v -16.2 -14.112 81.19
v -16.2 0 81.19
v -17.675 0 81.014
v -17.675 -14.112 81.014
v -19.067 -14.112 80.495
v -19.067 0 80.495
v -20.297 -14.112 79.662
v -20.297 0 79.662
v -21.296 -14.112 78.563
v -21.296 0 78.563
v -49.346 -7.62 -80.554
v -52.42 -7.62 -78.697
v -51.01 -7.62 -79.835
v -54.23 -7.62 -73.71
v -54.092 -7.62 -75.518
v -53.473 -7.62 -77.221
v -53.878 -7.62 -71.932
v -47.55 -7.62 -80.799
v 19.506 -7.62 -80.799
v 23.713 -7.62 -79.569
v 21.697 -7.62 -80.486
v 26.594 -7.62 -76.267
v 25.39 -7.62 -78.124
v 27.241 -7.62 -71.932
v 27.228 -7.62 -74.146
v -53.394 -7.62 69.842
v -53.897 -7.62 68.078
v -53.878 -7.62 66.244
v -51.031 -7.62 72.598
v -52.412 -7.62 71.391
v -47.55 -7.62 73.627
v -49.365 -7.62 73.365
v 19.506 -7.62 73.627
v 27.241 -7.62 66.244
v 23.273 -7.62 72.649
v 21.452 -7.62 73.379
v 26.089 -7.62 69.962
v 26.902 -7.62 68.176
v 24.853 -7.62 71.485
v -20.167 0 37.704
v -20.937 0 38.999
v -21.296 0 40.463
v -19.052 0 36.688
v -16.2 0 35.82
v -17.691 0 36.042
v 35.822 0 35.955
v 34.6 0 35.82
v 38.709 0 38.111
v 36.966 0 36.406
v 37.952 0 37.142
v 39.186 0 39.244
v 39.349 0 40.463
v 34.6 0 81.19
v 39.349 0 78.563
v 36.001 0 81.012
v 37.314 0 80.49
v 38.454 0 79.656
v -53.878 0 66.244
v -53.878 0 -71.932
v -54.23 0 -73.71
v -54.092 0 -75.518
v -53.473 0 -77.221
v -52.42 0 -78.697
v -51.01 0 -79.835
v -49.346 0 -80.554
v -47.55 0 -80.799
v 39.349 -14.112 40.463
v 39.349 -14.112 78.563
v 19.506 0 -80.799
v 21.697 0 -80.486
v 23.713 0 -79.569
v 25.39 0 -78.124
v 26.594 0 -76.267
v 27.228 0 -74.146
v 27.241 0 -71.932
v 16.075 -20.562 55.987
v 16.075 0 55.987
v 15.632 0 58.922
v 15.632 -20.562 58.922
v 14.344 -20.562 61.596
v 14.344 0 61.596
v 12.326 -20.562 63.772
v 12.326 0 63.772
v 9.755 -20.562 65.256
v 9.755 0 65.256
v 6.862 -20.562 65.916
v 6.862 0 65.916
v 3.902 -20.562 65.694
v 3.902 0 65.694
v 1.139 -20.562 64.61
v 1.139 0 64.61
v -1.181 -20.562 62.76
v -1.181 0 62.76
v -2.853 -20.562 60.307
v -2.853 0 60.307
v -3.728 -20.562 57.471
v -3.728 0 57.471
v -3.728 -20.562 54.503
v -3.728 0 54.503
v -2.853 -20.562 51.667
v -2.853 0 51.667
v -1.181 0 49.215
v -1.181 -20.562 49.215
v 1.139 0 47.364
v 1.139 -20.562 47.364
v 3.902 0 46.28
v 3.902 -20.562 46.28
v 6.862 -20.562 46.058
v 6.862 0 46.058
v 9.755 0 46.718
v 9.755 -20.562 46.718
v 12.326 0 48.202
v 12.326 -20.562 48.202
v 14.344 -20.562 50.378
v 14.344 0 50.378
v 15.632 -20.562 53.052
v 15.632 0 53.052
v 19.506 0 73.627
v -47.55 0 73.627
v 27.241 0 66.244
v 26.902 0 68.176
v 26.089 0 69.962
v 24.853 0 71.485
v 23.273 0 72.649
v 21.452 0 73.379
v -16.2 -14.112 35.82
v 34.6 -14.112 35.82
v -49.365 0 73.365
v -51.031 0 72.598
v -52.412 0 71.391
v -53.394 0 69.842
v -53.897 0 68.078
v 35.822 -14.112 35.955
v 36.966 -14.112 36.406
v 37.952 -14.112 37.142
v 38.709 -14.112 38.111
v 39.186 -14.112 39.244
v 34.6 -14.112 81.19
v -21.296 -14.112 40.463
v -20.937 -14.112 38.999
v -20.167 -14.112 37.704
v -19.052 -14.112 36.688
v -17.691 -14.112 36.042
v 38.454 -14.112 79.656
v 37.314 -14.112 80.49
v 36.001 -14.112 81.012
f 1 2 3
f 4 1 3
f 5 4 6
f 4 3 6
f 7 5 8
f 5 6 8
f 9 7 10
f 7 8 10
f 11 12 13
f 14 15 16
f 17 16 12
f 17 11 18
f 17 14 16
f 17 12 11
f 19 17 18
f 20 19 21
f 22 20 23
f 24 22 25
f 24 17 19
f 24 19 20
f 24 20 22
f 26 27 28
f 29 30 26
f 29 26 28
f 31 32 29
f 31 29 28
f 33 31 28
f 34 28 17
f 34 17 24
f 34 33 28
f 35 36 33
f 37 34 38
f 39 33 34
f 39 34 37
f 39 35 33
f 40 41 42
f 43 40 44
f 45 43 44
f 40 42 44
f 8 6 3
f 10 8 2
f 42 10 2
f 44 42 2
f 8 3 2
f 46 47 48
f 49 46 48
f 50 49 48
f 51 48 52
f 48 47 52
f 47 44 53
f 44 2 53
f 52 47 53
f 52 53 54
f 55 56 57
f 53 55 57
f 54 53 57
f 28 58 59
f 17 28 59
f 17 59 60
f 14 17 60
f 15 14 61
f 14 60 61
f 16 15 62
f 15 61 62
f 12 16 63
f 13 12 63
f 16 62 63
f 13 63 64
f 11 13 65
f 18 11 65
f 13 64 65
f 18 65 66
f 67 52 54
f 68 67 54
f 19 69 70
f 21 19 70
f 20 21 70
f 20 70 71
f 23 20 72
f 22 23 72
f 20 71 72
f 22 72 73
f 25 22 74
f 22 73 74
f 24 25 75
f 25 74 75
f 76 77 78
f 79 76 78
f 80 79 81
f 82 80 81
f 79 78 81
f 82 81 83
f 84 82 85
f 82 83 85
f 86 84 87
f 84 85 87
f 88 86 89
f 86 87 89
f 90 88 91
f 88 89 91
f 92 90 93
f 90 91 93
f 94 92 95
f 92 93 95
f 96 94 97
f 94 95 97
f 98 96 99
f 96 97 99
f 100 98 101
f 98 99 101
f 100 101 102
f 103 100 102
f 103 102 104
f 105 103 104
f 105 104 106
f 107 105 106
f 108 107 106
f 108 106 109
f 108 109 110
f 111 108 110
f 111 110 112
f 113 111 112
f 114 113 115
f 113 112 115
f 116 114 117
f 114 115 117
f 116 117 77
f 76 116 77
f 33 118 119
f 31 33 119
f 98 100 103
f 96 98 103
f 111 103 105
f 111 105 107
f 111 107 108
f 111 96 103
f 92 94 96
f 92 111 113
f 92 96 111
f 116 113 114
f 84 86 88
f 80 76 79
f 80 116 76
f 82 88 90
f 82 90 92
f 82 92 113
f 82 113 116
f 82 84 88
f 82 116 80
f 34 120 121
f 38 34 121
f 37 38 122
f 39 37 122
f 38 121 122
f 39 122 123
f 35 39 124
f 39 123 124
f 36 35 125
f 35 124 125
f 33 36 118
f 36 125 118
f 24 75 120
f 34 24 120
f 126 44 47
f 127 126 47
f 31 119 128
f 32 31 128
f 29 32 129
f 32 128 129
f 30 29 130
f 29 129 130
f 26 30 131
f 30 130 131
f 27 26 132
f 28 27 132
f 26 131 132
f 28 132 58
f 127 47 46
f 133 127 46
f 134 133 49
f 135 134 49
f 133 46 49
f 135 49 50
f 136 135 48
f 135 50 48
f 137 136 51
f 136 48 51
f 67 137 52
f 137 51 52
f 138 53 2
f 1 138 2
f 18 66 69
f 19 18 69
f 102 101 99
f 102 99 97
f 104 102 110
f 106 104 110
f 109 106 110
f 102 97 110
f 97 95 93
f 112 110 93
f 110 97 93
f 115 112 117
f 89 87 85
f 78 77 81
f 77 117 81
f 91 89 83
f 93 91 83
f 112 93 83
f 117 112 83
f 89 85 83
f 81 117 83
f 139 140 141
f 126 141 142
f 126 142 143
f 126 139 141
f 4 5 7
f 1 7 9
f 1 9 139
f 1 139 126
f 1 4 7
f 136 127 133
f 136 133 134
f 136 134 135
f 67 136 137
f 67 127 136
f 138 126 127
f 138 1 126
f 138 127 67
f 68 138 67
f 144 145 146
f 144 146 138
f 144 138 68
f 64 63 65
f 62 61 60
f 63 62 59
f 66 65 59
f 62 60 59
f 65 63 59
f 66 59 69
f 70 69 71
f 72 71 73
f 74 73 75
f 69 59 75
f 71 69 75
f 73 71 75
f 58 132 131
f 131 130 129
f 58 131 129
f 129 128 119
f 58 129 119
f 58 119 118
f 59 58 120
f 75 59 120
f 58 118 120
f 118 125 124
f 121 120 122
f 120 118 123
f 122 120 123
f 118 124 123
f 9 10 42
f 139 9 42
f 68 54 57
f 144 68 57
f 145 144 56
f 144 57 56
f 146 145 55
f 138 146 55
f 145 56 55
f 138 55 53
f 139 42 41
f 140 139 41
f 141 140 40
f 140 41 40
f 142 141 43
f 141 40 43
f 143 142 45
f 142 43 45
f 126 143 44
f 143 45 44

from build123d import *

# Parameters (mm, degrees)
F1_DEPTH = 7.62
F4_DEPTH = 14.11188
F3_R     = 9.956999
F5_DEPTH = 20.56223


with BuildPart() as f1:
    # F0 (on Front) → F1 (new body)
    with BuildSketch(Plane.XZ):
        with BuildLine():
            Line((19.506192, 73.627215), (-47.549808, 73.627215))
            ThreePointArc((-47.549808, 73.627215), (-52.412098, 71.390879), (-53.878481, 66.243765))
            Line((-53.878481, 66.243765), (-53.878481, -71.932235))
            ThreePointArc((-53.878481, -71.932235), (-52.996778, -77.994965), (-47.549808, -80.799357))
            Line((-47.549808, -80.799357), (19.506192, -80.799357))
            ThreePointArc((19.506192, -80.799357), (25.389577, -78.124289), (27.241243, -71.932235))
            Line((27.241243, -71.932235), (27.241243, 66.243765))
            ThreePointArc((27.241243, 66.243765), (24.852835, 71.485043), (19.506192, 73.627215))
        make_face()
    extrude(amount=F1_DEPTH)


with BuildPart() as f4:
    # F2 (on Front) → F4 (new body)
    with BuildSketch(Plane.XZ):
        with BuildLine():
            Line((-16.199785, 35.819632), (34.600215, 35.819632))
            ThreePointArc((34.600215, 35.819632), (37.951748, 37.142304), (39.349227, 40.46334))
            Line((39.349227, 40.46334), (39.349227, 78.56334))
            ThreePointArc((39.349227, 78.56334), (37.313708, 80.489545), (34.600215, 81.189945))
            Line((34.600215, 81.189945), (-16.199785, 81.189945))
            ThreePointArc((-16.199785, 81.189945), (-19.066591, 80.494671), (-21.296376, 78.56334))
            Line((-21.296376, 78.56334), (-21.296376, 40.46334))
            ThreePointArc((-21.296376, 40.46334), (-19.647221, 37.154656), (-16.199785, 35.819632))
        make_face()
    extrude(amount=F4_DEPTH)


with BuildPart() as f5:
    # F3 (on face) → F5 (new body)
    with BuildSketch(Plane.XZ):
        with Locations((6.117624, 55.987105)):
            Circle(F3_R)
    extrude(amount=F5_DEPTH)


solid = Compound([f1.part, f4.part, f5.part])
